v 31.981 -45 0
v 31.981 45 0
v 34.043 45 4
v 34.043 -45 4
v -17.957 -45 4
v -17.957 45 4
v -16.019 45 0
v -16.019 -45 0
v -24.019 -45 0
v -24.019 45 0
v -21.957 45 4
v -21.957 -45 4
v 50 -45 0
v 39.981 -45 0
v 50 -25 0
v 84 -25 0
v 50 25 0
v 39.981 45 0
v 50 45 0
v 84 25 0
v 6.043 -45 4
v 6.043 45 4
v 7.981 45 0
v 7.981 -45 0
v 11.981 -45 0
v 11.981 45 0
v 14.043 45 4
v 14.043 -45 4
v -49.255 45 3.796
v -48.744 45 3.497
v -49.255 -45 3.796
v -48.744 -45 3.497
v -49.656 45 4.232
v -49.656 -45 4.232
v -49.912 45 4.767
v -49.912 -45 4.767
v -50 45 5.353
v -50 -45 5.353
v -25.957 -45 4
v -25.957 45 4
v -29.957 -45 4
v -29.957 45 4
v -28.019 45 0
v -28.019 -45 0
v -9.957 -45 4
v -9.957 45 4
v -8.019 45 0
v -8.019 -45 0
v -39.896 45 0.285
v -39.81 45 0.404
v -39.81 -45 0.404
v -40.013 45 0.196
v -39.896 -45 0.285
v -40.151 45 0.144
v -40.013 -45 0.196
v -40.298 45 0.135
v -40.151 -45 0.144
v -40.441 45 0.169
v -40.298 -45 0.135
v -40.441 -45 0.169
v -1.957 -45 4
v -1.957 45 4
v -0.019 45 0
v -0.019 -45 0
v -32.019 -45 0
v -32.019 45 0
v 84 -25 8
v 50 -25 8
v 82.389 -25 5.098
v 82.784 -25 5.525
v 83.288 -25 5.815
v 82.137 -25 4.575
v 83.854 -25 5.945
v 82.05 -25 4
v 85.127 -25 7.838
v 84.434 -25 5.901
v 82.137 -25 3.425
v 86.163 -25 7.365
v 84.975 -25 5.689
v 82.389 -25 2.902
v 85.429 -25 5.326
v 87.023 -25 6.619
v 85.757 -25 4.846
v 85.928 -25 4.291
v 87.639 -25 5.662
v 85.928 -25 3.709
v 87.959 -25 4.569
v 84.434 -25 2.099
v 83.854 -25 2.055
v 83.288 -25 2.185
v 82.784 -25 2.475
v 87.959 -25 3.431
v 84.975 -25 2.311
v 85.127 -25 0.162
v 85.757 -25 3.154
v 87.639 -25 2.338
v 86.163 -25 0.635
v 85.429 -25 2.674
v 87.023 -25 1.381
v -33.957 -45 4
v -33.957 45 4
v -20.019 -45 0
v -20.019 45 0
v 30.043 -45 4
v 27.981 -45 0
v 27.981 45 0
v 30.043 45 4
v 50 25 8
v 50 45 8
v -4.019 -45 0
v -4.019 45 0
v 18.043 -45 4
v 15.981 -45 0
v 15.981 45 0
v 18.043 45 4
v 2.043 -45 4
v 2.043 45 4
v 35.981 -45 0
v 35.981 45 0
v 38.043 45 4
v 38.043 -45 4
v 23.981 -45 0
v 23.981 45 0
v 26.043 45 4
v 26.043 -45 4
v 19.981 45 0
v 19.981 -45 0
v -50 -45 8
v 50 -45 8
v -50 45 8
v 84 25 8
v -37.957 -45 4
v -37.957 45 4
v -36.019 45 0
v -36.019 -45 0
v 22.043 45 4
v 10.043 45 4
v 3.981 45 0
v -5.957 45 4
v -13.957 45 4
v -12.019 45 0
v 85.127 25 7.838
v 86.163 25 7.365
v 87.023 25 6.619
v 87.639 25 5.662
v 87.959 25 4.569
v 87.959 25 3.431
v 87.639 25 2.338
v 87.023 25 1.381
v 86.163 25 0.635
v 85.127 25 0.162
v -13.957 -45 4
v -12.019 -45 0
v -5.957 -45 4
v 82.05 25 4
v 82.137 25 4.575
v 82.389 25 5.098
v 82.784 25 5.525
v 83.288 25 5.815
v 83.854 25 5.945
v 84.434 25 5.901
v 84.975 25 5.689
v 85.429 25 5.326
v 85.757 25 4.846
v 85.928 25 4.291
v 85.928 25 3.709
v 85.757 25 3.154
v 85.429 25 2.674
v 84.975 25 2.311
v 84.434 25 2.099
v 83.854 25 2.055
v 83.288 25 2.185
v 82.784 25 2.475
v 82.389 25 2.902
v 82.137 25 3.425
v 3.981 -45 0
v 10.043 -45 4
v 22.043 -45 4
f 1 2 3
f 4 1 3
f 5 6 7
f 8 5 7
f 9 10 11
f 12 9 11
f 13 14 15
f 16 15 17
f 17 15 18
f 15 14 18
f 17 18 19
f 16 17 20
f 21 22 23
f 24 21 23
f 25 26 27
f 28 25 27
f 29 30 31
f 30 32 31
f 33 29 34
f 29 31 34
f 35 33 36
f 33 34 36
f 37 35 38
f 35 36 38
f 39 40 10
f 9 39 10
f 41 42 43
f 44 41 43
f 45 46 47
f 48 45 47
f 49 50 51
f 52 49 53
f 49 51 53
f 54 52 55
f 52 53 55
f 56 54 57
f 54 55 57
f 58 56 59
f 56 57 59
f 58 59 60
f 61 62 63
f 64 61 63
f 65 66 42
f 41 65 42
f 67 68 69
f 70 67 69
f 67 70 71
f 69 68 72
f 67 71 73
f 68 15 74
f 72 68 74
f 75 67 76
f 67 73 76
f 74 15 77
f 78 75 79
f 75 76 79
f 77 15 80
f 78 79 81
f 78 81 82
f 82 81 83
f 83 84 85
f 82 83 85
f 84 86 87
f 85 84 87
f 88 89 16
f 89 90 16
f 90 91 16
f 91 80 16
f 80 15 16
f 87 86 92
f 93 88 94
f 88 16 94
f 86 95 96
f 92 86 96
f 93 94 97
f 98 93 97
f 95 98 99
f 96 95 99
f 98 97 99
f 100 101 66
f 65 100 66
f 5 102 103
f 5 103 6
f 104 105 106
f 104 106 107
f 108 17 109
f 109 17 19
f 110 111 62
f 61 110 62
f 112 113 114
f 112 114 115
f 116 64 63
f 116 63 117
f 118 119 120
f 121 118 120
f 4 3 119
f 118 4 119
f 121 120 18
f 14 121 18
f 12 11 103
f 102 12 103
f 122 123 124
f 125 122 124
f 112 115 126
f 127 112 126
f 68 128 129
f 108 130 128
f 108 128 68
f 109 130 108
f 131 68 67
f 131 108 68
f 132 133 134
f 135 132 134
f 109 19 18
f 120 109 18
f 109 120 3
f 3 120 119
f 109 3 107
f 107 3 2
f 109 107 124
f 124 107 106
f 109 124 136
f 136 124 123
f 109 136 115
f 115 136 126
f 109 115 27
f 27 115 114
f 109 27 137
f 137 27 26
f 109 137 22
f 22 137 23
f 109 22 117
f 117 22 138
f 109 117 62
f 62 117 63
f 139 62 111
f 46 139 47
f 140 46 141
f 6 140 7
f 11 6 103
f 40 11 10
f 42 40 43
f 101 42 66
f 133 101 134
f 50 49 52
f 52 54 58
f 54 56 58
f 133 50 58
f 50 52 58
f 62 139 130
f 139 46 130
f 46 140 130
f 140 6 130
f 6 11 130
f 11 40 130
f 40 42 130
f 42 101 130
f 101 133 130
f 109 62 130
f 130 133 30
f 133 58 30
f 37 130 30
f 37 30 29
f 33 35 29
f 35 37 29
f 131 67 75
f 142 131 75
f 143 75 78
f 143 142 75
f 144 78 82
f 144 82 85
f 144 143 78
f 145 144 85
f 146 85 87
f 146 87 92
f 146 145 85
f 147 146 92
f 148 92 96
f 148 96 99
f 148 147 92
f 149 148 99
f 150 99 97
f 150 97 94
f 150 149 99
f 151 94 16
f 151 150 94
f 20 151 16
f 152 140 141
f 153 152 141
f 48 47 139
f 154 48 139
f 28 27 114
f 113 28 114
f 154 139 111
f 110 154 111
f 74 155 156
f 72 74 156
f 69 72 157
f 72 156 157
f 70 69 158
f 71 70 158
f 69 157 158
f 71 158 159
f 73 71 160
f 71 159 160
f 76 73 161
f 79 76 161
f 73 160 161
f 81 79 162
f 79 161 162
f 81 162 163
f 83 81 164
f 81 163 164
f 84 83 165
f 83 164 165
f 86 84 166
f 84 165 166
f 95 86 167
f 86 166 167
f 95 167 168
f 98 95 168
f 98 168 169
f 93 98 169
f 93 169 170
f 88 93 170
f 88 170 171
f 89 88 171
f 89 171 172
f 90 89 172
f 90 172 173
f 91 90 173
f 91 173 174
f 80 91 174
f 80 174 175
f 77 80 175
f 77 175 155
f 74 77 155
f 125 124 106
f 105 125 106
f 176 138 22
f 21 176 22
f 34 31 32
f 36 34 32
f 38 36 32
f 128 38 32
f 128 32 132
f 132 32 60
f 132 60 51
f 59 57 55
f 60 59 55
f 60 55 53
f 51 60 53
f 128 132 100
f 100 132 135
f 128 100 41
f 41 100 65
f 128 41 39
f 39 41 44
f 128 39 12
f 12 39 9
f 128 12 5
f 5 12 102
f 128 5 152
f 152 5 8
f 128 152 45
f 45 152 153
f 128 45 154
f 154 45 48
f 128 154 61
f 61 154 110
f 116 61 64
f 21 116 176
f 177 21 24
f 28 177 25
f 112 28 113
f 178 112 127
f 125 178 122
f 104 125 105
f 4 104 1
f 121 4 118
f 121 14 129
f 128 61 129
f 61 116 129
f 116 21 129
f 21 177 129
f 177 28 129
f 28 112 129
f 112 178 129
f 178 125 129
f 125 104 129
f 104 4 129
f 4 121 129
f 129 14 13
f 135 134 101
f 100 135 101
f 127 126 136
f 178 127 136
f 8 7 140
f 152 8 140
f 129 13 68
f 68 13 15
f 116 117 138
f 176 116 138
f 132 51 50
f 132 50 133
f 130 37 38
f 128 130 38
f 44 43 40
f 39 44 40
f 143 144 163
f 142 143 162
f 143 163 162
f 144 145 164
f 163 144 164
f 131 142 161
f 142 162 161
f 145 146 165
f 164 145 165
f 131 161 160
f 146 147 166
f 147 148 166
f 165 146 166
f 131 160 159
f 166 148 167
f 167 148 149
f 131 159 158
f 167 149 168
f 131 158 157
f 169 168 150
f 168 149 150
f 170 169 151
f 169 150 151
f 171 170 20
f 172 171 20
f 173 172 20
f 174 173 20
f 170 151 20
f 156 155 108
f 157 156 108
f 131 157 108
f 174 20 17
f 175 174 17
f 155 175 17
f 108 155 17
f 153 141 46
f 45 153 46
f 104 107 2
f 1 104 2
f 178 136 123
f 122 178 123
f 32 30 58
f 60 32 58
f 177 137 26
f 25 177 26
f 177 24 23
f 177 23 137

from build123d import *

# Parameters (mm, degrees)
BOSS_EXTRUDE1_DEPTH = 8
SKETCH2_R           = 1.95
CUT_EXTRUDE1_DEPTH  = 150
CUT_EXTRUDE2_DEPTH  = 150
CUT_EXTRUDE3_DEPTH  = 150
FILLET2_R           = 0.5
FILLET3_R           = 2


with BuildPart() as part:
    # Sketch1 → Boss-Extrude1 (new body)
    with BuildSketch(Plane.XY):
        Polygon((50, 45), (-50, 45), (-50, -45), (50, -45), (50, -25), (90, -25), (90, 25), (50, 25), align=None)
    extrude(amount=BOSS_EXTRUDE1_DEPTH)

    # Sketch2 → Cut-Extrude1 (cut)
    with BuildSketch(Plane(origin=(0, 25, 0), x_dir=(1, 0, 0), z_dir=(0, 1, 0))):
        with Locations(Location((84, -4, 0), (0, 0, 180))):
            Circle(SKETCH2_R)
    extrude(amount=-CUT_EXTRUDE1_DEPTH, mode=Mode.SUBTRACT)

    # Sketch3 → Cut-Extrude2 (cut)
    with BuildSketch(Plane(origin=(0, 25, 0), x_dir=(1, 0, 0), z_dir=(0, 1, 0))):
        with BuildLine():
            Line((90, -8), (84, -8))
            ThreePointArc((84, -8), (88, -4), (84, 0))
            Line((84, 0), (90, 0))
            Line((90, 0), (90, -8))
        make_face()
    extrude(amount=-CUT_EXTRUDE2_DEPTH, mode=Mode.SUBTRACT)

    # Sketch4 → Cut-Extrude3 (cut)
    with BuildSketch(Plane(origin=(0, 45, 0), x_dir=(1, 0, 0), z_dir=(0, 1, 0))):
        Polygon((-50, -4), (-40.018576331, 0), (-37.957023518, -4), (-36.018576331, 0), (-33.957023518, -4), (-32.018576331, 0), (-29.957023518, -4), (-28.018576331, 0), (-25.957023518, -4), (-24.018576331, 0), (-21.957023518, -4), (-20.018576331, 0), (-17.957023518, -4), (-16.018576331, 0), (-13.957023518, -4), (-12.018576331, 0), (-9.957023518, -4), (-8.018576331, 0), (-5.957023518, -4), (-4.018576331, 0), (-1.957023518, -4), (-0.018576331, 0), (2.042976482, -4), (3.981423669, 0), (6.042976482, -4), (7.981423669, 0), (10.042976482, -4), (11.981423669, 0), (14.042976482, -4), (15.981423669, 0), (18.042976482, -4), (19.981423669, 0), (22.042976482, -4), (23.981423669, 0), (26.042976482, -4), (27.981423669, 0), (30.042976482, -4), (31.981423669, 0), (34.042976482, -4), (35.981423669, 0), (38.042976482, -4), (39.981423669, 0), (37.159266961, 4.620546543), (-31.267866038, 8.187837837), (-50, 0), align=None)
    extrude(amount=-CUT_EXTRUDE3_DEPTH, mode=Mode.SUBTRACT)

    # Fillet2
    fillet2_edges = [part.edges().sort_by_distance(p)[0] for p in [
        (-40.018576331, 0, 0),
    ]]
    fillet(fillet2_edges, radius=FILLET2_R)

    # Fillet3
    fillet3_edges = [part.edges().sort_by_distance(p)[0] for p in [
        (-50, 0, 4),
    ]]
    fillet(fillet3_edges, radius=FILLET3_R)


solid = part.part
